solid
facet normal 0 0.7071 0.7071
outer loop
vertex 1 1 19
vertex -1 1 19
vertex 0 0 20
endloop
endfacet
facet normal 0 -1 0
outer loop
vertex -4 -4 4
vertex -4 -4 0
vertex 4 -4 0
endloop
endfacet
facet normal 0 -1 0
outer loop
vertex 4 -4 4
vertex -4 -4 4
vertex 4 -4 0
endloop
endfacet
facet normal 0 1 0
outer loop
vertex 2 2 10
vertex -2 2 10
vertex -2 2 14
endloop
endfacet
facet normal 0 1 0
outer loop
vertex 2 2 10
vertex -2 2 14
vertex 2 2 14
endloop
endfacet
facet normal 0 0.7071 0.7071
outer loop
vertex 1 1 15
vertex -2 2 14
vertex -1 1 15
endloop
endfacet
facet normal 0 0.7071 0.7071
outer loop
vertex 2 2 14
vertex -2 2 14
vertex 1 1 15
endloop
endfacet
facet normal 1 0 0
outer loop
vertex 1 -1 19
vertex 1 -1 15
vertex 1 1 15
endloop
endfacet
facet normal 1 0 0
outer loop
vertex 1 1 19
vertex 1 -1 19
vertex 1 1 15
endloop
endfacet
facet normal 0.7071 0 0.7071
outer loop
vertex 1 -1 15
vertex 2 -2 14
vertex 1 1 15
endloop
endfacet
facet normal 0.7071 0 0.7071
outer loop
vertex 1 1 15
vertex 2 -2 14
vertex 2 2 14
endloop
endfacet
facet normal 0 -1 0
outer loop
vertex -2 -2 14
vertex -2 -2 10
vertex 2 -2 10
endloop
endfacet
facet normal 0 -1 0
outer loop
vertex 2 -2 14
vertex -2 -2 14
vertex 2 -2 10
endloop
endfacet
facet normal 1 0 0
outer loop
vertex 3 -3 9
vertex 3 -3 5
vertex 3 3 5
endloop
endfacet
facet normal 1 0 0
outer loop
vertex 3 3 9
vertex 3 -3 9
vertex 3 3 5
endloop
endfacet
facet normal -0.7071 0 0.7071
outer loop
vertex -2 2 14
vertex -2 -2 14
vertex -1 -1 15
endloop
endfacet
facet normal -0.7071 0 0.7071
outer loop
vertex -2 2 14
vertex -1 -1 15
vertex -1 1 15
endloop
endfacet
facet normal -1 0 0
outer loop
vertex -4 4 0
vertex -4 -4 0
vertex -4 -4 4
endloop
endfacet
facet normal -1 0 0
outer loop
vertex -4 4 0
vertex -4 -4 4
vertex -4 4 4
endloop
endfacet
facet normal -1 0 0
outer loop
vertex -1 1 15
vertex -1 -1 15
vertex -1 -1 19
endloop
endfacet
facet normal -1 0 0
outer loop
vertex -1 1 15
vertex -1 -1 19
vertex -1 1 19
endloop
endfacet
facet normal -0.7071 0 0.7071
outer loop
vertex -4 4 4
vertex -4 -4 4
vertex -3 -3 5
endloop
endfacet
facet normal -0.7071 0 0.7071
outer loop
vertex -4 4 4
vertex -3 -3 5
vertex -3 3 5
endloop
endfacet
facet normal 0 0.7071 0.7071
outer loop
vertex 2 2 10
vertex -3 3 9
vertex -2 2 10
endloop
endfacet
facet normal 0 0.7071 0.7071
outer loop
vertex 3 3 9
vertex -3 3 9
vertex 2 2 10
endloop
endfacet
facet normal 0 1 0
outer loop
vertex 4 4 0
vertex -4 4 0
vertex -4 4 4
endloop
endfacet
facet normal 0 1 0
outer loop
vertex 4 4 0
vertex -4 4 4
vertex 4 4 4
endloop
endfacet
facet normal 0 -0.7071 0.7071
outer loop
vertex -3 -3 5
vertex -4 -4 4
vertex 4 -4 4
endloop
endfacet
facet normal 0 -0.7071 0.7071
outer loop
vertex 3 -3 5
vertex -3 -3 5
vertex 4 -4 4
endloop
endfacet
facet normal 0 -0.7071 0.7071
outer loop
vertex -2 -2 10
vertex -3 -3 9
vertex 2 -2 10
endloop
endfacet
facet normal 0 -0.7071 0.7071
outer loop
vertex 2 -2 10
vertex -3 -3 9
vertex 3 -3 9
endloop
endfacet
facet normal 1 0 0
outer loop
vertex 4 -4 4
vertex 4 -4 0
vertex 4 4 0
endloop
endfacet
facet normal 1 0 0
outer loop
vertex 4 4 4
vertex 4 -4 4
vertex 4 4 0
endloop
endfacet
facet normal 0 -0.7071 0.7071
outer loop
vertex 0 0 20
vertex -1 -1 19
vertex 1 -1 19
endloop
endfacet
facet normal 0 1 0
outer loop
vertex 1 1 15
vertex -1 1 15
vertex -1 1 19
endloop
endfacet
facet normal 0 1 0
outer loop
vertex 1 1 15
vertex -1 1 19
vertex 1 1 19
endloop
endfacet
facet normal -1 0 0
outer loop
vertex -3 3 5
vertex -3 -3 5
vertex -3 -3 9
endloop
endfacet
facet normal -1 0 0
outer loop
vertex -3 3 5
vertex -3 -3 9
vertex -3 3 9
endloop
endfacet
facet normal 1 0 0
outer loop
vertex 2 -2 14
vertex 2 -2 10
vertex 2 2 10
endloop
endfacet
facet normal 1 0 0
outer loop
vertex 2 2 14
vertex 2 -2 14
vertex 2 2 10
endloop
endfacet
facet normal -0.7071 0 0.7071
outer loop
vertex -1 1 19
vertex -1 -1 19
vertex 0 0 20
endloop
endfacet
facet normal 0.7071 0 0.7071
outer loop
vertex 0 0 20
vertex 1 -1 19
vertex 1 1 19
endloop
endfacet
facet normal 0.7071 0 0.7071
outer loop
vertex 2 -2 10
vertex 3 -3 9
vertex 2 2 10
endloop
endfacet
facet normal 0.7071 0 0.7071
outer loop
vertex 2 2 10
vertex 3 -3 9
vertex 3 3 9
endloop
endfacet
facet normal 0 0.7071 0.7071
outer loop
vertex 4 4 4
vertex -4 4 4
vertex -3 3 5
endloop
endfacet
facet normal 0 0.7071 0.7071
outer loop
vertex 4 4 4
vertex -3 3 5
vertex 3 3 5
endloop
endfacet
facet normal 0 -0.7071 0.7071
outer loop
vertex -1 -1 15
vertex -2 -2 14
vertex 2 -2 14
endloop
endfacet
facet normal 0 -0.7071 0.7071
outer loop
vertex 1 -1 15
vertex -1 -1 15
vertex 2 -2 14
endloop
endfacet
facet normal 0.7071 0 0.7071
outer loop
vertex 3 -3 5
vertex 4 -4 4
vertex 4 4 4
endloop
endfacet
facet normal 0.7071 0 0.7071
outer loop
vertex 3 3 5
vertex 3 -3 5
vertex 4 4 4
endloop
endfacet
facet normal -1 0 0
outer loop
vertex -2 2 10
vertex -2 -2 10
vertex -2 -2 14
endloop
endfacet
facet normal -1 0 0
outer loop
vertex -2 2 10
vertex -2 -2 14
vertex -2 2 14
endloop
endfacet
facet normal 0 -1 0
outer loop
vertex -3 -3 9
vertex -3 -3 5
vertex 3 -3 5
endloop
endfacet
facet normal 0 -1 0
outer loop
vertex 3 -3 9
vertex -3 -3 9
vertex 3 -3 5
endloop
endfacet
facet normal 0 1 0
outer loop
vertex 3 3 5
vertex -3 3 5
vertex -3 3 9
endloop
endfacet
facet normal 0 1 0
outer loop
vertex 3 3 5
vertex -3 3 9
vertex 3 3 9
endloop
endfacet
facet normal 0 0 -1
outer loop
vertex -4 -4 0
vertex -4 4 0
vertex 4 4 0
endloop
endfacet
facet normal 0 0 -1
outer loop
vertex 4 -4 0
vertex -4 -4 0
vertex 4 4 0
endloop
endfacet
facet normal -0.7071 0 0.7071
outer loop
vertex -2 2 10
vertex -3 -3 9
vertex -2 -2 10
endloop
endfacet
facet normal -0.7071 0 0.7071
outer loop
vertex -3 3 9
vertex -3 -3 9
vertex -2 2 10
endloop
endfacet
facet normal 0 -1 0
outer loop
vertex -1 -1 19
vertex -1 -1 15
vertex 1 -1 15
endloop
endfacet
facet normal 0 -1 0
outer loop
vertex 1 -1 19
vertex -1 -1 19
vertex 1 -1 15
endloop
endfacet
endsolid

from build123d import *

# Parameters (mm, degrees)
F0_W     = 8
F0_H     = 8
F0_W_2   = 6
F0_H_2   = 6
F1_DEPTH = 5
F0_W_3   = 4
F0_H_3   = 4
F2_DEPTH = 10
F0_W_4   = 2
F0_H_4   = 2
F3_DEPTH = 15
F4_DEPTH = 20
F5_SIZE  = 0.99999


# Not quite as in the source:
# - a fillet or chamfer is up to 0.001 mm smaller than in the source, because OpenCascade refuses the exact size


with BuildPart() as f1:
    # F0 (on Top) → F1 (new body)
    with BuildSketch(Plane.XY):
        Rectangle(F0_W, F0_H)
        Rectangle(F0_W_2, F0_H_2, mode=Mode.SUBTRACT)
    extrude(amount=F1_DEPTH)

    # F0 (on Top) → F2 (join)
    with BuildSketch(Plane.XY):
        Rectangle(F0_W_2, F0_H_2)
        Rectangle(F0_W_3, F0_H_3, mode=Mode.SUBTRACT)
    extrude(amount=F2_DEPTH)

    # F0 (on Top) → F3 (join)
    with BuildSketch(Plane.XY):
        Rectangle(F0_W_3, F0_H_3)
        Rectangle(F0_W_4, F0_H_4, mode=Mode.SUBTRACT)
    extrude(amount=F3_DEPTH)

    # F0 (on Top) → F4 (join)
    with BuildSketch(Plane.XY):
        Rectangle(F0_W_4, F0_H_4)
    extrude(amount=F4_DEPTH)

    # F5 (size 1 in the source; OpenCascade refuses exactly that, so slightly less here)
    f5_edges = [f1.edges().sort_by_distance(p)[0] for p in [
        (0, -4, 5),
        (4, 0, 5),
        (0, 4, 5),
        (-4, 0, 5),
        (0, -3, 10),
        (3, 0, 10),
        (-3, 0, 10),
        (0, 3, 10),
        (2, 0, 15),
        (0, -2, 15),
        (-2, 0, 15),
        (0, 2, 15),
        (1, 0, 20),
        (0, -1, 20),
        (-1, 0, 20),
        (0, 1, 20),
    ]]
    chamfer(f5_edges, length=F5_SIZE)


solid = f1.part
